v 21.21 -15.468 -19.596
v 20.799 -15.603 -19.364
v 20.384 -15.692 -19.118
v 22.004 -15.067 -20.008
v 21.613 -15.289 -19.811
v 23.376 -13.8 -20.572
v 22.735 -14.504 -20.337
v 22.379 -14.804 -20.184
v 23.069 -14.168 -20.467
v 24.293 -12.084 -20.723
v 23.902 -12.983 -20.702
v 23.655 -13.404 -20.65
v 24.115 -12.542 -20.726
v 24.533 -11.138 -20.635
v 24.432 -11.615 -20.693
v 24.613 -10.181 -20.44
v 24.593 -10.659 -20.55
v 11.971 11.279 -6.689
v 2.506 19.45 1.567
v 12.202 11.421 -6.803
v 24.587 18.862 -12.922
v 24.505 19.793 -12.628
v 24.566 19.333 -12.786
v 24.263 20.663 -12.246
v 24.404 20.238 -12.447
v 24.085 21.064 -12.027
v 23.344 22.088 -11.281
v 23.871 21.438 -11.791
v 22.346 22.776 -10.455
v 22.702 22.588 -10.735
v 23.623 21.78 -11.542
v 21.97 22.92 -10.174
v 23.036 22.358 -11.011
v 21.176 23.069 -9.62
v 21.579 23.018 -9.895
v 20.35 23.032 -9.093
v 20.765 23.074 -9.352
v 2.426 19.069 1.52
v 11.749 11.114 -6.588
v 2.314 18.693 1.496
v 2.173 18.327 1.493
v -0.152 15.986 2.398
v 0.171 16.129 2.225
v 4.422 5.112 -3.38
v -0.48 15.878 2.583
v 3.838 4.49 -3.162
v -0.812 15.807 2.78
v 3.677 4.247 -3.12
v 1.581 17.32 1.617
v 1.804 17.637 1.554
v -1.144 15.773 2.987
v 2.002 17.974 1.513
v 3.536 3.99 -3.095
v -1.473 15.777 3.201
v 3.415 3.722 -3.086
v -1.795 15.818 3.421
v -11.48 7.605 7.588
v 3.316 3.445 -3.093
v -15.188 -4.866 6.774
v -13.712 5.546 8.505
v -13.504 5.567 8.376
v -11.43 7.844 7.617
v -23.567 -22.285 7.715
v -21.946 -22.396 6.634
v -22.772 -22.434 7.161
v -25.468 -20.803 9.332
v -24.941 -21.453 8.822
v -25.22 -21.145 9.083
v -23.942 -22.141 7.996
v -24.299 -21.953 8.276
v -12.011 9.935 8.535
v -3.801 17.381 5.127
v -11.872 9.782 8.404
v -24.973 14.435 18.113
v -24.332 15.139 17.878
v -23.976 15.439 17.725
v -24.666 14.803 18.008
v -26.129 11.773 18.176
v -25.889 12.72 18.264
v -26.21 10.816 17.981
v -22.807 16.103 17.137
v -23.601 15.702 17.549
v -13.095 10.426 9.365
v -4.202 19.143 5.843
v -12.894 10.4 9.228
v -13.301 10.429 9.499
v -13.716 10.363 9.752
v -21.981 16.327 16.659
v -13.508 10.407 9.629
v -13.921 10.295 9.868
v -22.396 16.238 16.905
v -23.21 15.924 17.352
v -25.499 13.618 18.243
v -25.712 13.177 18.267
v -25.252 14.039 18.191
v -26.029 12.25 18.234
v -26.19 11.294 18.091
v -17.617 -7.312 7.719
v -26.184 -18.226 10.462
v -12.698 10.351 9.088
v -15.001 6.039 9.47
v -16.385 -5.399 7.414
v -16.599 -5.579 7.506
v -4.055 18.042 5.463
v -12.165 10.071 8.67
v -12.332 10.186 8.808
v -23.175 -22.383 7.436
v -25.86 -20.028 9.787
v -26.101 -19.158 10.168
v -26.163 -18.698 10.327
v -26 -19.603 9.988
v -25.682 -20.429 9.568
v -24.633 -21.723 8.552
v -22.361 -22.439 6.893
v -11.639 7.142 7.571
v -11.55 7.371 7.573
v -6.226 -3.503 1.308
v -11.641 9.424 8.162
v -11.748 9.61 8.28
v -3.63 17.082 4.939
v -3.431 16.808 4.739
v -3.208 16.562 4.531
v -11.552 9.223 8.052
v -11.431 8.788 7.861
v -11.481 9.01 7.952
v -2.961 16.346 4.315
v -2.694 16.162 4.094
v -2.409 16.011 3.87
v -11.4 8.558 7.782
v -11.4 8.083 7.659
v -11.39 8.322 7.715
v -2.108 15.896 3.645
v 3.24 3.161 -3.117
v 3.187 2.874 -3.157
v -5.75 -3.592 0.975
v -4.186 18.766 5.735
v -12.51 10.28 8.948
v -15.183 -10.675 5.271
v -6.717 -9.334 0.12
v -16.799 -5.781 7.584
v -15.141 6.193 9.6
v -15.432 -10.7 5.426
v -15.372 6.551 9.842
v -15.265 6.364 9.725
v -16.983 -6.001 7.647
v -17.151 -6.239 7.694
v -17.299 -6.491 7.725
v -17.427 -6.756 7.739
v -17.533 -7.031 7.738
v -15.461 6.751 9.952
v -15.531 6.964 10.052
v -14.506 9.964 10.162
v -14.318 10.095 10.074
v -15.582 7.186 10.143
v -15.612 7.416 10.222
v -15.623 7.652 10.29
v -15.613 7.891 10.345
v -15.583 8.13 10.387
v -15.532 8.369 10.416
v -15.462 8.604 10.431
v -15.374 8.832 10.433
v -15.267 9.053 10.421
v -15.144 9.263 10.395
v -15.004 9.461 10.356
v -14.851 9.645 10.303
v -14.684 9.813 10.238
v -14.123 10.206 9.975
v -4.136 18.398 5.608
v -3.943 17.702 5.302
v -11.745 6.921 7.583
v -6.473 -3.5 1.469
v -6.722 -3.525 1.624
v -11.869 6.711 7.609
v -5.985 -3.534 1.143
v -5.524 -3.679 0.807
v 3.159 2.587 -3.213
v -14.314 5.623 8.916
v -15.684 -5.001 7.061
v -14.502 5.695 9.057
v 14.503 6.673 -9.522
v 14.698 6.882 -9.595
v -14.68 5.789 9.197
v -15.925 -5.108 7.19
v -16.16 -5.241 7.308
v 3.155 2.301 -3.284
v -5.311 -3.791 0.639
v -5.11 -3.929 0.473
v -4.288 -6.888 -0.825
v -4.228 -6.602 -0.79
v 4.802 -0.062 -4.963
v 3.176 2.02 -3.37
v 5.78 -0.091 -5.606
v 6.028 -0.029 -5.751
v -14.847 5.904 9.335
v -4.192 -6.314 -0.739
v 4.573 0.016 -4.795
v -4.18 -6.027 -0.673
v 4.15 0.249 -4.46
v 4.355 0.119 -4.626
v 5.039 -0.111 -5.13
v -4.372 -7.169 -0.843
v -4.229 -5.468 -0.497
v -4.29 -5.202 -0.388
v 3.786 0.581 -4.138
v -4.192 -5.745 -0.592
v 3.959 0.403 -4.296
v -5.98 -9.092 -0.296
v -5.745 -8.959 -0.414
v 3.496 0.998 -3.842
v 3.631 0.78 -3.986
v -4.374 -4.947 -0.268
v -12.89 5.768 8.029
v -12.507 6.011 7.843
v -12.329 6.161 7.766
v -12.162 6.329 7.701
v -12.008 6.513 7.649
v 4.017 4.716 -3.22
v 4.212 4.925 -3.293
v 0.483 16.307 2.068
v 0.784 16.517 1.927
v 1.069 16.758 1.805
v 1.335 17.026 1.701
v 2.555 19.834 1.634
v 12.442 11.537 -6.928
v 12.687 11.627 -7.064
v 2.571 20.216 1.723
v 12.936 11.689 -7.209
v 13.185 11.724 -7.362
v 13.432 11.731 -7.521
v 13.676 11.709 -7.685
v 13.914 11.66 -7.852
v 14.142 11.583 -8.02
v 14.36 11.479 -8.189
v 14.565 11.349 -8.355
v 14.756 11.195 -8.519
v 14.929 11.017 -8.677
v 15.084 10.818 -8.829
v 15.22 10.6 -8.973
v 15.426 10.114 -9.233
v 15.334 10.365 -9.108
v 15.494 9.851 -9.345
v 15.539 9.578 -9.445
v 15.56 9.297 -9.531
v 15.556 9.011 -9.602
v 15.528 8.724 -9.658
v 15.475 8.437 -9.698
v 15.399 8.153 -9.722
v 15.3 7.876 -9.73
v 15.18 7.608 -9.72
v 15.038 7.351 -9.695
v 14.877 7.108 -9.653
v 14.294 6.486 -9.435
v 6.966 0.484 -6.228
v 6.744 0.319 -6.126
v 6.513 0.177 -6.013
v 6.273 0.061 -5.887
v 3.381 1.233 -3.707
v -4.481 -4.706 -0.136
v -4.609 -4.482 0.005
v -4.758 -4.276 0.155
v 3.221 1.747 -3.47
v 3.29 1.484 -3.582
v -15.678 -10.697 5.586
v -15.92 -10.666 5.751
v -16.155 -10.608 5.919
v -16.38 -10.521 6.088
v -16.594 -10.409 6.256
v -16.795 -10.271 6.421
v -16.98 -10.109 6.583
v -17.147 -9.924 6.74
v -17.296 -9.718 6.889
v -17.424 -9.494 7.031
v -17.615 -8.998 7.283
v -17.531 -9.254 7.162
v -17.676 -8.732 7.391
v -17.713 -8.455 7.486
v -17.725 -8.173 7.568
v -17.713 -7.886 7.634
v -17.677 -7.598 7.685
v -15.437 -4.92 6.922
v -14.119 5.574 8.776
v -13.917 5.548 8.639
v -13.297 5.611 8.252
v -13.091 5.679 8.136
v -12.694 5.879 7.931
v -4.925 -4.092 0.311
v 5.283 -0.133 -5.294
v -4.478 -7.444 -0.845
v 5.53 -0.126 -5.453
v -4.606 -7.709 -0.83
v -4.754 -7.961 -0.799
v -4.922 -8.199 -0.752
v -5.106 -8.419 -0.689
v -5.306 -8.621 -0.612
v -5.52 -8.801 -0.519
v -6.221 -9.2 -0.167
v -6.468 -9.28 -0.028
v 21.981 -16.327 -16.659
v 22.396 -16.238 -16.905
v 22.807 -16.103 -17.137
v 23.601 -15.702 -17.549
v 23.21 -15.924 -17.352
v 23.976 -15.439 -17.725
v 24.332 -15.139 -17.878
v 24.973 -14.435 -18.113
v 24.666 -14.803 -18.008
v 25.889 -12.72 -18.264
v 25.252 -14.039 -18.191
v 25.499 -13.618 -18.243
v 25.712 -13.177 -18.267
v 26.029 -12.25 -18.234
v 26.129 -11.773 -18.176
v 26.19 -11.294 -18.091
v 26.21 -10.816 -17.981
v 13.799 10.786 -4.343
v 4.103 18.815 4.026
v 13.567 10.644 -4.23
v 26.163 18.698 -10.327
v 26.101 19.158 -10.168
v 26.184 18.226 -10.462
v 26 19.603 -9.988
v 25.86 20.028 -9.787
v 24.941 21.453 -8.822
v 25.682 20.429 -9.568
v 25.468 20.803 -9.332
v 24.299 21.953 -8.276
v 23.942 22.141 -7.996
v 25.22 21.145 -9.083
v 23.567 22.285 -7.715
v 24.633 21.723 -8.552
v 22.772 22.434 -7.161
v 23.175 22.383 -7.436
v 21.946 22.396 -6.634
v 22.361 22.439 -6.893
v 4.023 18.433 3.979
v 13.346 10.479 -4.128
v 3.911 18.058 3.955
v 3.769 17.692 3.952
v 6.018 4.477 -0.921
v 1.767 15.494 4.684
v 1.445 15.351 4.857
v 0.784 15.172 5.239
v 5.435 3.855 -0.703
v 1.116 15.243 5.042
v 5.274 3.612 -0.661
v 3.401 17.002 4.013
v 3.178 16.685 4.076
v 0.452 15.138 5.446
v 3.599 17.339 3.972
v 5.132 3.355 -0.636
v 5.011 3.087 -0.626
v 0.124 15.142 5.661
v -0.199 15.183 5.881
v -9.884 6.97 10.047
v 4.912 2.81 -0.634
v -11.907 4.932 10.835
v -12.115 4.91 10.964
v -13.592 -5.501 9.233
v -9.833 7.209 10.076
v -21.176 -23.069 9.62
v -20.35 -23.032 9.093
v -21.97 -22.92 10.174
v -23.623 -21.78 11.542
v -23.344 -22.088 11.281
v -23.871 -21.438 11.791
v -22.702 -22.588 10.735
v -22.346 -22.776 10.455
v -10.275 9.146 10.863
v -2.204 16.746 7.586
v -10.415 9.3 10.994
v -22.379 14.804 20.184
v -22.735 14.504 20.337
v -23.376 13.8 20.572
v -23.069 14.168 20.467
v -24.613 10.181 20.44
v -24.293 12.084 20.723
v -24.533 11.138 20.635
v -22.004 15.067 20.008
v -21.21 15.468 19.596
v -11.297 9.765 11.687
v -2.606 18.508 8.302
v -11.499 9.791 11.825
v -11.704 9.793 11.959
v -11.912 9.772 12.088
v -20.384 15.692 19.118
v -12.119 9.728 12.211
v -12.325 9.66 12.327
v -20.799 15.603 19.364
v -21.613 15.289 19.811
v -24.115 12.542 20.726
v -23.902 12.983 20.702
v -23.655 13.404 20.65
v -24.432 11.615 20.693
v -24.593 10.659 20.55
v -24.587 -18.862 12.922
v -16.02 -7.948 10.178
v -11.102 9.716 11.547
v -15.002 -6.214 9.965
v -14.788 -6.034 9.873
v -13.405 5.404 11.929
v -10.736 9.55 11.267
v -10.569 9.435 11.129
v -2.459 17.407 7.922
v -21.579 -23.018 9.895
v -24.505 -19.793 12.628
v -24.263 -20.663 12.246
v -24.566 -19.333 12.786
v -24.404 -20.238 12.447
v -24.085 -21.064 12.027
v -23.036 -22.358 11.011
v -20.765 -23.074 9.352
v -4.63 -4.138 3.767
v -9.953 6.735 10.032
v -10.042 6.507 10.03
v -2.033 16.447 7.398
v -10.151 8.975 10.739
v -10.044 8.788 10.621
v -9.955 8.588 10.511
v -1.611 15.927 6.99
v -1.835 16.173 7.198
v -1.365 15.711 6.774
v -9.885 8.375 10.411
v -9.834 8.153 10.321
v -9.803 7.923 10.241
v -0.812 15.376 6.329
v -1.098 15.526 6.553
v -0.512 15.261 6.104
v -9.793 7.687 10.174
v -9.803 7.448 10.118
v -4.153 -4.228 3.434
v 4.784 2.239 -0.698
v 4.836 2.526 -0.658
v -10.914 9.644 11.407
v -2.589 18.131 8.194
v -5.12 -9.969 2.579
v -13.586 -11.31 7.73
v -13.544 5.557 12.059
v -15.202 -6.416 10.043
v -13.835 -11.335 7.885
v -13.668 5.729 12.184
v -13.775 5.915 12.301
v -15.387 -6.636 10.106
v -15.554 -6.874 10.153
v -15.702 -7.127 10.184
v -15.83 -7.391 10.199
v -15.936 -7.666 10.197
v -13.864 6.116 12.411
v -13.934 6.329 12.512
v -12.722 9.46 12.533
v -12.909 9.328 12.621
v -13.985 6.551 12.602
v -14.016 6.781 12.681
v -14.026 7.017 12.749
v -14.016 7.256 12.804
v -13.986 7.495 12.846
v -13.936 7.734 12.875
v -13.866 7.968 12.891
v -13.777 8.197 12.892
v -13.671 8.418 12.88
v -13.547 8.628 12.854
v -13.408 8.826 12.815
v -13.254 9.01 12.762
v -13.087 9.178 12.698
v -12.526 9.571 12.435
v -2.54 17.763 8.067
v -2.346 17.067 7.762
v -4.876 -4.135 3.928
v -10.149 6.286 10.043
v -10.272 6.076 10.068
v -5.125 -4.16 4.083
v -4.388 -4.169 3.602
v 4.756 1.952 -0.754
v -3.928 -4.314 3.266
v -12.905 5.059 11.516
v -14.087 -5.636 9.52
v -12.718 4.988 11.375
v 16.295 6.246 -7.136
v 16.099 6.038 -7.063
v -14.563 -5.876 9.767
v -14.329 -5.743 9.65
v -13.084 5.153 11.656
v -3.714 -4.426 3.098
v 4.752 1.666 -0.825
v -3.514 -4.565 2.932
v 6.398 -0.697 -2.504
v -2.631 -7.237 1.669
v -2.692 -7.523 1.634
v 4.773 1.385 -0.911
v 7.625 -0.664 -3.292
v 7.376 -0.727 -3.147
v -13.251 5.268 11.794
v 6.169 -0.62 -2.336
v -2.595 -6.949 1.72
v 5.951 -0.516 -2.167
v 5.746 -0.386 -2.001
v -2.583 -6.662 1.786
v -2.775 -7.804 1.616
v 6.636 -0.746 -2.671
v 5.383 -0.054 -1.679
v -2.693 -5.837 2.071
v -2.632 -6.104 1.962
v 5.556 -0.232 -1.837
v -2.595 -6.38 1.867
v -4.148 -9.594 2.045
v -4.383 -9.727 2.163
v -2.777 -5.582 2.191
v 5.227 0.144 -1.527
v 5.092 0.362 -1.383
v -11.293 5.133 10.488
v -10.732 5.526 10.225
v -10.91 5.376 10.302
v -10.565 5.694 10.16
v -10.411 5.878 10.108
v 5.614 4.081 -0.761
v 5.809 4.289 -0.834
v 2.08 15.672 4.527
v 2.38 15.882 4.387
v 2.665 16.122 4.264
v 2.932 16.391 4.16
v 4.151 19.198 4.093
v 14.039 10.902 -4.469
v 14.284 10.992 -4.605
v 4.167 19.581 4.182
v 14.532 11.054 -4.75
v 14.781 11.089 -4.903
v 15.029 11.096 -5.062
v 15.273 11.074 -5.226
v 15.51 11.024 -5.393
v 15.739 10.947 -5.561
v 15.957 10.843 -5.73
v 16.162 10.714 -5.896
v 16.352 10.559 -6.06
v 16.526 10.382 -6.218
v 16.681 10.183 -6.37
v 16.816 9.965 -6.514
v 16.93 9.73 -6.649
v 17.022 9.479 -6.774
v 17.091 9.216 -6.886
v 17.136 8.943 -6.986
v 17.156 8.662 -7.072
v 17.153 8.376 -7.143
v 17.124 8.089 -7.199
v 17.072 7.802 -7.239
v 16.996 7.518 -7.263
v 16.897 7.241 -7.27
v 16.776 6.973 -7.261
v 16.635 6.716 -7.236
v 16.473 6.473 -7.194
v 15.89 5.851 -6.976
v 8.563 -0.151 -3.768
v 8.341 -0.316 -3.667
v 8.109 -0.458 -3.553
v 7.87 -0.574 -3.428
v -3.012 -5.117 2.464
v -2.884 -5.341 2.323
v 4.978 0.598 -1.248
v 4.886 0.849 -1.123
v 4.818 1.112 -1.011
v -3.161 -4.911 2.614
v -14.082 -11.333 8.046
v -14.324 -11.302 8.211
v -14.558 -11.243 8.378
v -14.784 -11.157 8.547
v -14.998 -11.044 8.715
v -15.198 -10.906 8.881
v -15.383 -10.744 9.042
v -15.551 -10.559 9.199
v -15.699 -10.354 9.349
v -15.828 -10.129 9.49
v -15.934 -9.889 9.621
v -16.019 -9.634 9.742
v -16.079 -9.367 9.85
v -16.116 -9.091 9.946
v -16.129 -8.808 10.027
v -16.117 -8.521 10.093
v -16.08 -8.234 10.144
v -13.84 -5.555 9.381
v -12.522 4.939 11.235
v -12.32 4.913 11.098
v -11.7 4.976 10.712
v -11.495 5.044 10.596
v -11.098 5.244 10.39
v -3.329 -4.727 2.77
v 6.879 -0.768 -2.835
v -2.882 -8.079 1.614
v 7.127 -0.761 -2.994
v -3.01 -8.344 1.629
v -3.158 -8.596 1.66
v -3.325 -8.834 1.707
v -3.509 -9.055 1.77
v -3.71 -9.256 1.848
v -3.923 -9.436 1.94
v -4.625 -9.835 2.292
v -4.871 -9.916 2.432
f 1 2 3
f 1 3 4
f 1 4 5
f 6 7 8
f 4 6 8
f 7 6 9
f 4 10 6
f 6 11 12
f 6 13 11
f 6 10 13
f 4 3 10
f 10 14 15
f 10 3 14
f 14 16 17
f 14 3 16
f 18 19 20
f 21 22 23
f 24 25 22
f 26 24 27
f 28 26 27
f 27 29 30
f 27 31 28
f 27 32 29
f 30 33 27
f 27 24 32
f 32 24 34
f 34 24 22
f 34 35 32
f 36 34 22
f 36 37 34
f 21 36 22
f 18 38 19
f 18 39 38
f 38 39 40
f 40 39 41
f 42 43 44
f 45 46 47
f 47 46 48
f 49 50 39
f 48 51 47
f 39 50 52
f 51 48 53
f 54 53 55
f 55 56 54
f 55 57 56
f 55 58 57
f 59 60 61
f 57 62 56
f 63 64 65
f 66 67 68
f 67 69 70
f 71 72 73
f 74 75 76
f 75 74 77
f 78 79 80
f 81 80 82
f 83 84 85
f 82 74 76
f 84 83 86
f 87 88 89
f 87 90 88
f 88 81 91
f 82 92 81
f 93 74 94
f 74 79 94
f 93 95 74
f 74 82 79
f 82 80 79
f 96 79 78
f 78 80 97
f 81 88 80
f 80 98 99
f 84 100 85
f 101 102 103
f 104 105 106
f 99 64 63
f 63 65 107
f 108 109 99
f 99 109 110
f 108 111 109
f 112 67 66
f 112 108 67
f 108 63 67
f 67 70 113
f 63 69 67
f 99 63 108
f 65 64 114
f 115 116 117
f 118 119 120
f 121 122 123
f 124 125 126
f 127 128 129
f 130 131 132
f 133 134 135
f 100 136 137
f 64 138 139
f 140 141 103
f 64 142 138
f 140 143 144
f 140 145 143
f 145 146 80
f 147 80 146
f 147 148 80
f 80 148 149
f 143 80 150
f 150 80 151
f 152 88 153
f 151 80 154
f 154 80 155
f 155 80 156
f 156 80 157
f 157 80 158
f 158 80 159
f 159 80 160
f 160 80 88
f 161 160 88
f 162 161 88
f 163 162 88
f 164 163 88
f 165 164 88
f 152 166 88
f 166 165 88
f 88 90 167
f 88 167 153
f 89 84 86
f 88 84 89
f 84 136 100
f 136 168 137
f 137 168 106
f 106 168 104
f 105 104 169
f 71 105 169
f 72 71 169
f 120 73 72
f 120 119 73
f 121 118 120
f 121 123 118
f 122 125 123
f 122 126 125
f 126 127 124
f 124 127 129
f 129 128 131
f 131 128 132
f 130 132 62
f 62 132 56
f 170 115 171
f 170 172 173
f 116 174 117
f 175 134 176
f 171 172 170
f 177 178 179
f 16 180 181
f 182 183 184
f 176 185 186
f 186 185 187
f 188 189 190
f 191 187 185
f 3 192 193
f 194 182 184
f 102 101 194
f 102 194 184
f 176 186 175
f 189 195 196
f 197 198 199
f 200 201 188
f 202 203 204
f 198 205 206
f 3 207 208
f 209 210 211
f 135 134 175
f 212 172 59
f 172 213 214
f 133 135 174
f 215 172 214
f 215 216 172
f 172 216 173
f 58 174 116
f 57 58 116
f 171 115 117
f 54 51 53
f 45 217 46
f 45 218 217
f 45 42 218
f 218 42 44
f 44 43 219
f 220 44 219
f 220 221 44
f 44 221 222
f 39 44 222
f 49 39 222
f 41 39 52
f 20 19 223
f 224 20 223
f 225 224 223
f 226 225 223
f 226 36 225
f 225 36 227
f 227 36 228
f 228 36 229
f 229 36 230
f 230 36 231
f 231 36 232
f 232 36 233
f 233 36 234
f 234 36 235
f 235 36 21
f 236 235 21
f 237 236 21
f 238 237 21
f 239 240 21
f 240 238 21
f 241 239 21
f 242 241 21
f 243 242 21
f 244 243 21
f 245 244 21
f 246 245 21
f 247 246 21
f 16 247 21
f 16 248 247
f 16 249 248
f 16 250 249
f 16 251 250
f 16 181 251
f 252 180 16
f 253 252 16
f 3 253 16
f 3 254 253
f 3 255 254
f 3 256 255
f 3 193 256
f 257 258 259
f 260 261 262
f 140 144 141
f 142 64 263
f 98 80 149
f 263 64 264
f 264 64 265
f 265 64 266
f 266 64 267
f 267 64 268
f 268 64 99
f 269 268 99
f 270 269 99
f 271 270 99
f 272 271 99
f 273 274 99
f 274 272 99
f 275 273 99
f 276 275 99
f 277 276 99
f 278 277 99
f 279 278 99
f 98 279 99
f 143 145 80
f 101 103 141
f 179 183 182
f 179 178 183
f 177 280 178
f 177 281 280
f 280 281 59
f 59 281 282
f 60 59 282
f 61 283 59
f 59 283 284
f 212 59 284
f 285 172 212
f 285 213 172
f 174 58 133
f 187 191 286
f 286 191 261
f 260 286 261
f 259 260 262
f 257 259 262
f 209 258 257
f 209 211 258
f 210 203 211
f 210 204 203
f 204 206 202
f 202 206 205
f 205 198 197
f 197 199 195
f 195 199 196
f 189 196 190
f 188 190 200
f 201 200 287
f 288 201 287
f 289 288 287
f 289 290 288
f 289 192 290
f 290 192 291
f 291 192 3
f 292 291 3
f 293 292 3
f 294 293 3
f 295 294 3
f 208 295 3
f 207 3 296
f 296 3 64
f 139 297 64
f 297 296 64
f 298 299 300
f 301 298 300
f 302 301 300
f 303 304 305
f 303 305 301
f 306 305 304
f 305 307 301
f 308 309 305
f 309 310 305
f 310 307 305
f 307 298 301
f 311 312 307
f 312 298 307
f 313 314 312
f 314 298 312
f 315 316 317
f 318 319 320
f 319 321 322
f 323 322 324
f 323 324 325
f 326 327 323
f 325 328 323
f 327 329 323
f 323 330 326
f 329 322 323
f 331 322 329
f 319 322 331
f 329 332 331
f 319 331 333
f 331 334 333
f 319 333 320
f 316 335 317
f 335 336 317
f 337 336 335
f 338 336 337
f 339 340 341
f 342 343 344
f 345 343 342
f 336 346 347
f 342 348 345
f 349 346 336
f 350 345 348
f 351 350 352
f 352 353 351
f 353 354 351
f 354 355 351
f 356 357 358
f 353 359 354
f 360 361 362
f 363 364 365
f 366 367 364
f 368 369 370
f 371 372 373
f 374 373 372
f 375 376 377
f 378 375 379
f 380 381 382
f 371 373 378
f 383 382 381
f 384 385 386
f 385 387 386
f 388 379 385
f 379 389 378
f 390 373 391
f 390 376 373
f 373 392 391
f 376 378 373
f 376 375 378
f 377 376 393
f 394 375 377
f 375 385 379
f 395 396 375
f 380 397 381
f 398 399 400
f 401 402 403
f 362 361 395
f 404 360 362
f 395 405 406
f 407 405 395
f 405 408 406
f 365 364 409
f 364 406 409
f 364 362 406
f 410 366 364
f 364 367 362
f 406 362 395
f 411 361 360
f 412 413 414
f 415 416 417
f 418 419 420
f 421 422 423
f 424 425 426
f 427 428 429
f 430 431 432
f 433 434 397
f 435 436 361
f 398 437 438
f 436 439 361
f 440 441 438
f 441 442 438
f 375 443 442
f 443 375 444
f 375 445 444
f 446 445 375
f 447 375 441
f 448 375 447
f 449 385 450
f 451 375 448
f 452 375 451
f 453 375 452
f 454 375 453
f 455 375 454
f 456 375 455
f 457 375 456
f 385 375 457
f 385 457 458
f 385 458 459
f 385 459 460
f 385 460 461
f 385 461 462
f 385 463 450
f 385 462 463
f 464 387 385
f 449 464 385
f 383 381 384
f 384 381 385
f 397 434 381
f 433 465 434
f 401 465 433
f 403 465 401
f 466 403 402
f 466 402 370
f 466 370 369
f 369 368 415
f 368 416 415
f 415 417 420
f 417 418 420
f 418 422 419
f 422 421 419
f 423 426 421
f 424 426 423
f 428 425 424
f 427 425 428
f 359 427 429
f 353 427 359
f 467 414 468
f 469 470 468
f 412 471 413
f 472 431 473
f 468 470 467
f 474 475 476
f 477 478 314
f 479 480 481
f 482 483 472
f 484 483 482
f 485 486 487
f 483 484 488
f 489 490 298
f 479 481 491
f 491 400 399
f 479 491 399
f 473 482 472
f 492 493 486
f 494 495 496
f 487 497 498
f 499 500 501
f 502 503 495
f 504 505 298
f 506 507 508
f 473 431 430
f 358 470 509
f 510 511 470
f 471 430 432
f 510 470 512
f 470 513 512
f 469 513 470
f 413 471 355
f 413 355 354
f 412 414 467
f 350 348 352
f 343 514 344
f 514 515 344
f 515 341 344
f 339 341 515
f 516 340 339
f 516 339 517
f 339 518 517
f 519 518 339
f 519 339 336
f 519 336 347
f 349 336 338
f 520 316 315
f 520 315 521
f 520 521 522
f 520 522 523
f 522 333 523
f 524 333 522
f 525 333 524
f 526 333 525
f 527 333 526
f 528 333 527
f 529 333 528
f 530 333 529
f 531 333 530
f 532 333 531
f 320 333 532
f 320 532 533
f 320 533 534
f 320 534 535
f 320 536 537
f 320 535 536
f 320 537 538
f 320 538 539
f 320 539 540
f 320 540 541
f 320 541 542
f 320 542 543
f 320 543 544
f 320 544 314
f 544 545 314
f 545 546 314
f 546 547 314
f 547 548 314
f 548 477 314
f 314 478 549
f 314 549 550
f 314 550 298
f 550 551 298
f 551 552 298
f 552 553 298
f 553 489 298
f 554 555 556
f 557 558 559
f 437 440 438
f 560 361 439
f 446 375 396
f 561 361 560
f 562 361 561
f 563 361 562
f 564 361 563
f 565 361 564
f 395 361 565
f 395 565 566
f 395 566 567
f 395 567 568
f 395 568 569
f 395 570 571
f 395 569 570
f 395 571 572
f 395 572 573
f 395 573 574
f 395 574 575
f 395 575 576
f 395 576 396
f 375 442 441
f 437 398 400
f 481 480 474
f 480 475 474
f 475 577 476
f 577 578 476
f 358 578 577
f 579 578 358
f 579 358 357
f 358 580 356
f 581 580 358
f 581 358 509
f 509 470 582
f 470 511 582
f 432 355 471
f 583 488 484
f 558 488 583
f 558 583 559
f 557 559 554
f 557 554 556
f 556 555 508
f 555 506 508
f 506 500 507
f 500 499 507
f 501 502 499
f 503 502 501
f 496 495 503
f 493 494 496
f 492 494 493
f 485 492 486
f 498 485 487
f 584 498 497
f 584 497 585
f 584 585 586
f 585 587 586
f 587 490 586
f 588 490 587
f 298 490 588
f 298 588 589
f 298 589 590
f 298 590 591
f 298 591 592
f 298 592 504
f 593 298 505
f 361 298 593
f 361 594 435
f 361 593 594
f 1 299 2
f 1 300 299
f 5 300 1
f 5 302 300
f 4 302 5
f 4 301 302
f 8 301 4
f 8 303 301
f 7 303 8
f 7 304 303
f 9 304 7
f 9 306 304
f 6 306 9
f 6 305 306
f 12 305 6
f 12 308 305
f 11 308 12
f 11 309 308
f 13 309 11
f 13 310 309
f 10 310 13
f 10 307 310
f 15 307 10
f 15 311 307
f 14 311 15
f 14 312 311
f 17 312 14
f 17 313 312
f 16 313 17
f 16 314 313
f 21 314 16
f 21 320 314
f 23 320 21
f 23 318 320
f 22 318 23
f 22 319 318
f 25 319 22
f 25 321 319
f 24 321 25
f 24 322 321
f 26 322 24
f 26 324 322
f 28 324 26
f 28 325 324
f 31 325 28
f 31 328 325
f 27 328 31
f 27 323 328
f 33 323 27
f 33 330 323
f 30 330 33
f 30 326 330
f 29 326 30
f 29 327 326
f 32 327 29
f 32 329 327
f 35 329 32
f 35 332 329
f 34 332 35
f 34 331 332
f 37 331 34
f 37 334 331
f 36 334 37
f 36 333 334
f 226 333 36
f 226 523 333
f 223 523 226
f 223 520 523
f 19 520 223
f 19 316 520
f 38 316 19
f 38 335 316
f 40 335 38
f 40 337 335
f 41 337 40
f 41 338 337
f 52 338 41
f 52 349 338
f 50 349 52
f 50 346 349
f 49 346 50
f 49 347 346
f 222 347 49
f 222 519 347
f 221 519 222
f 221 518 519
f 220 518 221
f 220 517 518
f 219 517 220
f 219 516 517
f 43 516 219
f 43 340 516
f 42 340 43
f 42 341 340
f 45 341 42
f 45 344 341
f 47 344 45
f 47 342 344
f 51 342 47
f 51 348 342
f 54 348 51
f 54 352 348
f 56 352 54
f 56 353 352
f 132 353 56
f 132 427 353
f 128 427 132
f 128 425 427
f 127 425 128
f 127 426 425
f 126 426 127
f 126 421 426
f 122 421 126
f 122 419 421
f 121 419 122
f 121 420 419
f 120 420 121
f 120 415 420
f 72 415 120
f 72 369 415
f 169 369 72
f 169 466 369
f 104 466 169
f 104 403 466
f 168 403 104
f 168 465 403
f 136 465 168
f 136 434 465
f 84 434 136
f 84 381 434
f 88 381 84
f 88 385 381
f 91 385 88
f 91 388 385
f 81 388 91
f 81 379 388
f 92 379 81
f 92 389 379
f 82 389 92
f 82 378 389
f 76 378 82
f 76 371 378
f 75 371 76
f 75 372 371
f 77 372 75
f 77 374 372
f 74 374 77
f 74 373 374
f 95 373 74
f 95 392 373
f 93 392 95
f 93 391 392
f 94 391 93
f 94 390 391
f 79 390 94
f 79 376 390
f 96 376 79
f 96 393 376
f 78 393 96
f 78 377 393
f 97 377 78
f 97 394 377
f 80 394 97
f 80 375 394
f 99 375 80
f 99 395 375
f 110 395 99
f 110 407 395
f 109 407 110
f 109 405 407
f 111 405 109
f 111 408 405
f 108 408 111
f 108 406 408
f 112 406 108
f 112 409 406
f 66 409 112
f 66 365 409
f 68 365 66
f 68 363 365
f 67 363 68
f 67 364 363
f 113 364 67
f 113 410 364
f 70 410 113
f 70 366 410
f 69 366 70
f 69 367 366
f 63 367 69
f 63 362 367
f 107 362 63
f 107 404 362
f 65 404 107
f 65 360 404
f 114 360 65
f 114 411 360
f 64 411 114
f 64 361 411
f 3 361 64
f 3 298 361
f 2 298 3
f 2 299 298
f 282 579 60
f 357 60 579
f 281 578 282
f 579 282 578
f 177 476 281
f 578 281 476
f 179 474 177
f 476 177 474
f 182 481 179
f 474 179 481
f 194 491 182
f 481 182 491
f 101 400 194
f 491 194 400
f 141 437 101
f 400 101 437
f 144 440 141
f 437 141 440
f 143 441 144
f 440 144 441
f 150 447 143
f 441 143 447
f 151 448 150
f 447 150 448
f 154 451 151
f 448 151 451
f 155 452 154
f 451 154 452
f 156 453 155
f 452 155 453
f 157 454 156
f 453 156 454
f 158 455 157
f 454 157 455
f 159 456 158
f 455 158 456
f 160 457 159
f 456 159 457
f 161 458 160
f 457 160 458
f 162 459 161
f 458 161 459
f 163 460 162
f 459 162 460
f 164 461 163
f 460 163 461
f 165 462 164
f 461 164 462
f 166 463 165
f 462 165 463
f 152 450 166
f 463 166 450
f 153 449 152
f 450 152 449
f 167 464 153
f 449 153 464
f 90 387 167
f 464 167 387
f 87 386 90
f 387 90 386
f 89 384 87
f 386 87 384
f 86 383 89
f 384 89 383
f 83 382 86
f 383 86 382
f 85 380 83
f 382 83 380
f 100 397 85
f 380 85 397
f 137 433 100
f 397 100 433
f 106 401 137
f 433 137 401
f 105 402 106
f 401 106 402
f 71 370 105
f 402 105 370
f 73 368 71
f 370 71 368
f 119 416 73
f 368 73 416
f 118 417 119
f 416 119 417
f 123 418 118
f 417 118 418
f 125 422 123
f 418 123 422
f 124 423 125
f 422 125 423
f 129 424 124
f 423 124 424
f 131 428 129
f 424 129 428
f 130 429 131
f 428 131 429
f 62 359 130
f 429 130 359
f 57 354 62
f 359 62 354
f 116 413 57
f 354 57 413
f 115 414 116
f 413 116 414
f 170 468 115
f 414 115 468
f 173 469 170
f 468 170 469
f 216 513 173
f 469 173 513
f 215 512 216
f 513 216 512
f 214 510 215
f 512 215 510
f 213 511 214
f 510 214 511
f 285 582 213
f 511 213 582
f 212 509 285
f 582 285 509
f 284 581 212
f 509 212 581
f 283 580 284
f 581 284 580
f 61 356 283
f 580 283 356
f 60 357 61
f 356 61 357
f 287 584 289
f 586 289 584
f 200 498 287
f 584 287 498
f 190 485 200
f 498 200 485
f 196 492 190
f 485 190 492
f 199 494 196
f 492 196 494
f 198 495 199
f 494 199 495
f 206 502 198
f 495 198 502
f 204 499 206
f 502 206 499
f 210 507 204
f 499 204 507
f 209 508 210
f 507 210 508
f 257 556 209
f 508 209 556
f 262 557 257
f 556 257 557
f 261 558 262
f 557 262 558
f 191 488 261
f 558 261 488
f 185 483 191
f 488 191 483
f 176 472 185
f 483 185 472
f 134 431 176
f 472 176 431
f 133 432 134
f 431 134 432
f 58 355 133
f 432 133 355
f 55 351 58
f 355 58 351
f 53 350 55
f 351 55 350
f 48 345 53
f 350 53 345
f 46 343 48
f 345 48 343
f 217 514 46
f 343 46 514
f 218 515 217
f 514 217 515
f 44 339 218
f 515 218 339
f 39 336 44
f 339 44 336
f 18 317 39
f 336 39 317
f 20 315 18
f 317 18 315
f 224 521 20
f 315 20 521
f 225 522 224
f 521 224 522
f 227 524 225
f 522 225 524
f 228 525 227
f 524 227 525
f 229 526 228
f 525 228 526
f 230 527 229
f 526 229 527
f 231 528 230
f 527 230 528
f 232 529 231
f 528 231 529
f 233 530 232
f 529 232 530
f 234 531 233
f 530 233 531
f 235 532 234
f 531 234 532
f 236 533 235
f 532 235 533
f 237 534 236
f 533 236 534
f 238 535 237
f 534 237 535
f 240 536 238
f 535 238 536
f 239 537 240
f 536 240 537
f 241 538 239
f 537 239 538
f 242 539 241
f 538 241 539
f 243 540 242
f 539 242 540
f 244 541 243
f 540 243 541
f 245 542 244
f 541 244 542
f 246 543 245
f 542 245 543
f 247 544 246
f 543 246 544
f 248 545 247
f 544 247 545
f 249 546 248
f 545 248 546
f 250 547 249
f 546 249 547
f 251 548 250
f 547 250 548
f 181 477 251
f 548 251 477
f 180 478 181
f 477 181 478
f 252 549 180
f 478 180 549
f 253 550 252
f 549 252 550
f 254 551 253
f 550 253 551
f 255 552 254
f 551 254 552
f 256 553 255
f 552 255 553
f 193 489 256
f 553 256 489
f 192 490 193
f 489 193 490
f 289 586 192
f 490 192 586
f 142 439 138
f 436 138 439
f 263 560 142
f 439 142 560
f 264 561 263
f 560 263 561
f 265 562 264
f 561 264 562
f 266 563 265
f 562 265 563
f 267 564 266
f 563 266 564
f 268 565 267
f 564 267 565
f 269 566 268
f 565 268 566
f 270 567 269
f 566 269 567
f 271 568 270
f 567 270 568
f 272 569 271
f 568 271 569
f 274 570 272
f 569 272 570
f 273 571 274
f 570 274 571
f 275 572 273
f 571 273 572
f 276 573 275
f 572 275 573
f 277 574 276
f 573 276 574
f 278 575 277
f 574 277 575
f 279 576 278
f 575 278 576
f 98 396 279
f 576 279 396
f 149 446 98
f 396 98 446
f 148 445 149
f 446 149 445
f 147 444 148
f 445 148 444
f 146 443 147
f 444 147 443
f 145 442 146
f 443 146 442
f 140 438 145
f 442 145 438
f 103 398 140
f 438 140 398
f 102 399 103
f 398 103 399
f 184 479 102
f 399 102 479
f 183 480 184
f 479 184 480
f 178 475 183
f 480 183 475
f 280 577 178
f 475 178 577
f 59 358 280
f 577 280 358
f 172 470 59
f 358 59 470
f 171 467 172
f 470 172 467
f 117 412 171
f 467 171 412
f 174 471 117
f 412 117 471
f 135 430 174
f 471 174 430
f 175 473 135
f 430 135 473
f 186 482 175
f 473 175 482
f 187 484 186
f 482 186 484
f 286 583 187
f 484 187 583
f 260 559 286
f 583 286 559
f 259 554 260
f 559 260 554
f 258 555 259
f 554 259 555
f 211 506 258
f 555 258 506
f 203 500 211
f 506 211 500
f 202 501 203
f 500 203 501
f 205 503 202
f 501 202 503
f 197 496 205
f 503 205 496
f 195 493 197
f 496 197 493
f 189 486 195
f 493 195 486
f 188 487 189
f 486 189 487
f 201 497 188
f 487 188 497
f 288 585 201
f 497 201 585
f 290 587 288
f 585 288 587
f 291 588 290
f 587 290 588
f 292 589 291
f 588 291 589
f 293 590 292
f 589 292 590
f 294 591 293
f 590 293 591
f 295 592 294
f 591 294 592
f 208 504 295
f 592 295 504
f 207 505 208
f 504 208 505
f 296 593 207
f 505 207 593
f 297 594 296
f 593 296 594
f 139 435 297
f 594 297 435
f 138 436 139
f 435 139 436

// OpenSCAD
// file: rounded_plate.scad
// Independent, hand-written ground truth: rounds belong to the 2D outline.
// Overall slot length includes the two semicircular ends.
$fn = 64;

module rounded_plate() {
    linear_extrude(height=3) difference() {
        hull() for (x=[5,55], y=[5,35]) translate([x,y]) circle(r=5);
        translate([30,40]) circle(r=4); // concave semicircular outline notch
        translate([18,14]) hull() for (x=[-5,5]) translate([x,0]) circle(r=3);
        translate([42,24]) rotate(30)
            hull() for (x=[-5,5]) translate([x,0]) circle(r=3);
        translate([15,30]) circle(d=5);
    }
}

rounded_plate();
// main file
// Same part in an arbitrary rigid frame; the included call is suppressed.
use <rounded_plate.scad>
$fn = 64;
rotate([17,31,9]) translate([-30,-20,-1.5]) rounded_plate();
